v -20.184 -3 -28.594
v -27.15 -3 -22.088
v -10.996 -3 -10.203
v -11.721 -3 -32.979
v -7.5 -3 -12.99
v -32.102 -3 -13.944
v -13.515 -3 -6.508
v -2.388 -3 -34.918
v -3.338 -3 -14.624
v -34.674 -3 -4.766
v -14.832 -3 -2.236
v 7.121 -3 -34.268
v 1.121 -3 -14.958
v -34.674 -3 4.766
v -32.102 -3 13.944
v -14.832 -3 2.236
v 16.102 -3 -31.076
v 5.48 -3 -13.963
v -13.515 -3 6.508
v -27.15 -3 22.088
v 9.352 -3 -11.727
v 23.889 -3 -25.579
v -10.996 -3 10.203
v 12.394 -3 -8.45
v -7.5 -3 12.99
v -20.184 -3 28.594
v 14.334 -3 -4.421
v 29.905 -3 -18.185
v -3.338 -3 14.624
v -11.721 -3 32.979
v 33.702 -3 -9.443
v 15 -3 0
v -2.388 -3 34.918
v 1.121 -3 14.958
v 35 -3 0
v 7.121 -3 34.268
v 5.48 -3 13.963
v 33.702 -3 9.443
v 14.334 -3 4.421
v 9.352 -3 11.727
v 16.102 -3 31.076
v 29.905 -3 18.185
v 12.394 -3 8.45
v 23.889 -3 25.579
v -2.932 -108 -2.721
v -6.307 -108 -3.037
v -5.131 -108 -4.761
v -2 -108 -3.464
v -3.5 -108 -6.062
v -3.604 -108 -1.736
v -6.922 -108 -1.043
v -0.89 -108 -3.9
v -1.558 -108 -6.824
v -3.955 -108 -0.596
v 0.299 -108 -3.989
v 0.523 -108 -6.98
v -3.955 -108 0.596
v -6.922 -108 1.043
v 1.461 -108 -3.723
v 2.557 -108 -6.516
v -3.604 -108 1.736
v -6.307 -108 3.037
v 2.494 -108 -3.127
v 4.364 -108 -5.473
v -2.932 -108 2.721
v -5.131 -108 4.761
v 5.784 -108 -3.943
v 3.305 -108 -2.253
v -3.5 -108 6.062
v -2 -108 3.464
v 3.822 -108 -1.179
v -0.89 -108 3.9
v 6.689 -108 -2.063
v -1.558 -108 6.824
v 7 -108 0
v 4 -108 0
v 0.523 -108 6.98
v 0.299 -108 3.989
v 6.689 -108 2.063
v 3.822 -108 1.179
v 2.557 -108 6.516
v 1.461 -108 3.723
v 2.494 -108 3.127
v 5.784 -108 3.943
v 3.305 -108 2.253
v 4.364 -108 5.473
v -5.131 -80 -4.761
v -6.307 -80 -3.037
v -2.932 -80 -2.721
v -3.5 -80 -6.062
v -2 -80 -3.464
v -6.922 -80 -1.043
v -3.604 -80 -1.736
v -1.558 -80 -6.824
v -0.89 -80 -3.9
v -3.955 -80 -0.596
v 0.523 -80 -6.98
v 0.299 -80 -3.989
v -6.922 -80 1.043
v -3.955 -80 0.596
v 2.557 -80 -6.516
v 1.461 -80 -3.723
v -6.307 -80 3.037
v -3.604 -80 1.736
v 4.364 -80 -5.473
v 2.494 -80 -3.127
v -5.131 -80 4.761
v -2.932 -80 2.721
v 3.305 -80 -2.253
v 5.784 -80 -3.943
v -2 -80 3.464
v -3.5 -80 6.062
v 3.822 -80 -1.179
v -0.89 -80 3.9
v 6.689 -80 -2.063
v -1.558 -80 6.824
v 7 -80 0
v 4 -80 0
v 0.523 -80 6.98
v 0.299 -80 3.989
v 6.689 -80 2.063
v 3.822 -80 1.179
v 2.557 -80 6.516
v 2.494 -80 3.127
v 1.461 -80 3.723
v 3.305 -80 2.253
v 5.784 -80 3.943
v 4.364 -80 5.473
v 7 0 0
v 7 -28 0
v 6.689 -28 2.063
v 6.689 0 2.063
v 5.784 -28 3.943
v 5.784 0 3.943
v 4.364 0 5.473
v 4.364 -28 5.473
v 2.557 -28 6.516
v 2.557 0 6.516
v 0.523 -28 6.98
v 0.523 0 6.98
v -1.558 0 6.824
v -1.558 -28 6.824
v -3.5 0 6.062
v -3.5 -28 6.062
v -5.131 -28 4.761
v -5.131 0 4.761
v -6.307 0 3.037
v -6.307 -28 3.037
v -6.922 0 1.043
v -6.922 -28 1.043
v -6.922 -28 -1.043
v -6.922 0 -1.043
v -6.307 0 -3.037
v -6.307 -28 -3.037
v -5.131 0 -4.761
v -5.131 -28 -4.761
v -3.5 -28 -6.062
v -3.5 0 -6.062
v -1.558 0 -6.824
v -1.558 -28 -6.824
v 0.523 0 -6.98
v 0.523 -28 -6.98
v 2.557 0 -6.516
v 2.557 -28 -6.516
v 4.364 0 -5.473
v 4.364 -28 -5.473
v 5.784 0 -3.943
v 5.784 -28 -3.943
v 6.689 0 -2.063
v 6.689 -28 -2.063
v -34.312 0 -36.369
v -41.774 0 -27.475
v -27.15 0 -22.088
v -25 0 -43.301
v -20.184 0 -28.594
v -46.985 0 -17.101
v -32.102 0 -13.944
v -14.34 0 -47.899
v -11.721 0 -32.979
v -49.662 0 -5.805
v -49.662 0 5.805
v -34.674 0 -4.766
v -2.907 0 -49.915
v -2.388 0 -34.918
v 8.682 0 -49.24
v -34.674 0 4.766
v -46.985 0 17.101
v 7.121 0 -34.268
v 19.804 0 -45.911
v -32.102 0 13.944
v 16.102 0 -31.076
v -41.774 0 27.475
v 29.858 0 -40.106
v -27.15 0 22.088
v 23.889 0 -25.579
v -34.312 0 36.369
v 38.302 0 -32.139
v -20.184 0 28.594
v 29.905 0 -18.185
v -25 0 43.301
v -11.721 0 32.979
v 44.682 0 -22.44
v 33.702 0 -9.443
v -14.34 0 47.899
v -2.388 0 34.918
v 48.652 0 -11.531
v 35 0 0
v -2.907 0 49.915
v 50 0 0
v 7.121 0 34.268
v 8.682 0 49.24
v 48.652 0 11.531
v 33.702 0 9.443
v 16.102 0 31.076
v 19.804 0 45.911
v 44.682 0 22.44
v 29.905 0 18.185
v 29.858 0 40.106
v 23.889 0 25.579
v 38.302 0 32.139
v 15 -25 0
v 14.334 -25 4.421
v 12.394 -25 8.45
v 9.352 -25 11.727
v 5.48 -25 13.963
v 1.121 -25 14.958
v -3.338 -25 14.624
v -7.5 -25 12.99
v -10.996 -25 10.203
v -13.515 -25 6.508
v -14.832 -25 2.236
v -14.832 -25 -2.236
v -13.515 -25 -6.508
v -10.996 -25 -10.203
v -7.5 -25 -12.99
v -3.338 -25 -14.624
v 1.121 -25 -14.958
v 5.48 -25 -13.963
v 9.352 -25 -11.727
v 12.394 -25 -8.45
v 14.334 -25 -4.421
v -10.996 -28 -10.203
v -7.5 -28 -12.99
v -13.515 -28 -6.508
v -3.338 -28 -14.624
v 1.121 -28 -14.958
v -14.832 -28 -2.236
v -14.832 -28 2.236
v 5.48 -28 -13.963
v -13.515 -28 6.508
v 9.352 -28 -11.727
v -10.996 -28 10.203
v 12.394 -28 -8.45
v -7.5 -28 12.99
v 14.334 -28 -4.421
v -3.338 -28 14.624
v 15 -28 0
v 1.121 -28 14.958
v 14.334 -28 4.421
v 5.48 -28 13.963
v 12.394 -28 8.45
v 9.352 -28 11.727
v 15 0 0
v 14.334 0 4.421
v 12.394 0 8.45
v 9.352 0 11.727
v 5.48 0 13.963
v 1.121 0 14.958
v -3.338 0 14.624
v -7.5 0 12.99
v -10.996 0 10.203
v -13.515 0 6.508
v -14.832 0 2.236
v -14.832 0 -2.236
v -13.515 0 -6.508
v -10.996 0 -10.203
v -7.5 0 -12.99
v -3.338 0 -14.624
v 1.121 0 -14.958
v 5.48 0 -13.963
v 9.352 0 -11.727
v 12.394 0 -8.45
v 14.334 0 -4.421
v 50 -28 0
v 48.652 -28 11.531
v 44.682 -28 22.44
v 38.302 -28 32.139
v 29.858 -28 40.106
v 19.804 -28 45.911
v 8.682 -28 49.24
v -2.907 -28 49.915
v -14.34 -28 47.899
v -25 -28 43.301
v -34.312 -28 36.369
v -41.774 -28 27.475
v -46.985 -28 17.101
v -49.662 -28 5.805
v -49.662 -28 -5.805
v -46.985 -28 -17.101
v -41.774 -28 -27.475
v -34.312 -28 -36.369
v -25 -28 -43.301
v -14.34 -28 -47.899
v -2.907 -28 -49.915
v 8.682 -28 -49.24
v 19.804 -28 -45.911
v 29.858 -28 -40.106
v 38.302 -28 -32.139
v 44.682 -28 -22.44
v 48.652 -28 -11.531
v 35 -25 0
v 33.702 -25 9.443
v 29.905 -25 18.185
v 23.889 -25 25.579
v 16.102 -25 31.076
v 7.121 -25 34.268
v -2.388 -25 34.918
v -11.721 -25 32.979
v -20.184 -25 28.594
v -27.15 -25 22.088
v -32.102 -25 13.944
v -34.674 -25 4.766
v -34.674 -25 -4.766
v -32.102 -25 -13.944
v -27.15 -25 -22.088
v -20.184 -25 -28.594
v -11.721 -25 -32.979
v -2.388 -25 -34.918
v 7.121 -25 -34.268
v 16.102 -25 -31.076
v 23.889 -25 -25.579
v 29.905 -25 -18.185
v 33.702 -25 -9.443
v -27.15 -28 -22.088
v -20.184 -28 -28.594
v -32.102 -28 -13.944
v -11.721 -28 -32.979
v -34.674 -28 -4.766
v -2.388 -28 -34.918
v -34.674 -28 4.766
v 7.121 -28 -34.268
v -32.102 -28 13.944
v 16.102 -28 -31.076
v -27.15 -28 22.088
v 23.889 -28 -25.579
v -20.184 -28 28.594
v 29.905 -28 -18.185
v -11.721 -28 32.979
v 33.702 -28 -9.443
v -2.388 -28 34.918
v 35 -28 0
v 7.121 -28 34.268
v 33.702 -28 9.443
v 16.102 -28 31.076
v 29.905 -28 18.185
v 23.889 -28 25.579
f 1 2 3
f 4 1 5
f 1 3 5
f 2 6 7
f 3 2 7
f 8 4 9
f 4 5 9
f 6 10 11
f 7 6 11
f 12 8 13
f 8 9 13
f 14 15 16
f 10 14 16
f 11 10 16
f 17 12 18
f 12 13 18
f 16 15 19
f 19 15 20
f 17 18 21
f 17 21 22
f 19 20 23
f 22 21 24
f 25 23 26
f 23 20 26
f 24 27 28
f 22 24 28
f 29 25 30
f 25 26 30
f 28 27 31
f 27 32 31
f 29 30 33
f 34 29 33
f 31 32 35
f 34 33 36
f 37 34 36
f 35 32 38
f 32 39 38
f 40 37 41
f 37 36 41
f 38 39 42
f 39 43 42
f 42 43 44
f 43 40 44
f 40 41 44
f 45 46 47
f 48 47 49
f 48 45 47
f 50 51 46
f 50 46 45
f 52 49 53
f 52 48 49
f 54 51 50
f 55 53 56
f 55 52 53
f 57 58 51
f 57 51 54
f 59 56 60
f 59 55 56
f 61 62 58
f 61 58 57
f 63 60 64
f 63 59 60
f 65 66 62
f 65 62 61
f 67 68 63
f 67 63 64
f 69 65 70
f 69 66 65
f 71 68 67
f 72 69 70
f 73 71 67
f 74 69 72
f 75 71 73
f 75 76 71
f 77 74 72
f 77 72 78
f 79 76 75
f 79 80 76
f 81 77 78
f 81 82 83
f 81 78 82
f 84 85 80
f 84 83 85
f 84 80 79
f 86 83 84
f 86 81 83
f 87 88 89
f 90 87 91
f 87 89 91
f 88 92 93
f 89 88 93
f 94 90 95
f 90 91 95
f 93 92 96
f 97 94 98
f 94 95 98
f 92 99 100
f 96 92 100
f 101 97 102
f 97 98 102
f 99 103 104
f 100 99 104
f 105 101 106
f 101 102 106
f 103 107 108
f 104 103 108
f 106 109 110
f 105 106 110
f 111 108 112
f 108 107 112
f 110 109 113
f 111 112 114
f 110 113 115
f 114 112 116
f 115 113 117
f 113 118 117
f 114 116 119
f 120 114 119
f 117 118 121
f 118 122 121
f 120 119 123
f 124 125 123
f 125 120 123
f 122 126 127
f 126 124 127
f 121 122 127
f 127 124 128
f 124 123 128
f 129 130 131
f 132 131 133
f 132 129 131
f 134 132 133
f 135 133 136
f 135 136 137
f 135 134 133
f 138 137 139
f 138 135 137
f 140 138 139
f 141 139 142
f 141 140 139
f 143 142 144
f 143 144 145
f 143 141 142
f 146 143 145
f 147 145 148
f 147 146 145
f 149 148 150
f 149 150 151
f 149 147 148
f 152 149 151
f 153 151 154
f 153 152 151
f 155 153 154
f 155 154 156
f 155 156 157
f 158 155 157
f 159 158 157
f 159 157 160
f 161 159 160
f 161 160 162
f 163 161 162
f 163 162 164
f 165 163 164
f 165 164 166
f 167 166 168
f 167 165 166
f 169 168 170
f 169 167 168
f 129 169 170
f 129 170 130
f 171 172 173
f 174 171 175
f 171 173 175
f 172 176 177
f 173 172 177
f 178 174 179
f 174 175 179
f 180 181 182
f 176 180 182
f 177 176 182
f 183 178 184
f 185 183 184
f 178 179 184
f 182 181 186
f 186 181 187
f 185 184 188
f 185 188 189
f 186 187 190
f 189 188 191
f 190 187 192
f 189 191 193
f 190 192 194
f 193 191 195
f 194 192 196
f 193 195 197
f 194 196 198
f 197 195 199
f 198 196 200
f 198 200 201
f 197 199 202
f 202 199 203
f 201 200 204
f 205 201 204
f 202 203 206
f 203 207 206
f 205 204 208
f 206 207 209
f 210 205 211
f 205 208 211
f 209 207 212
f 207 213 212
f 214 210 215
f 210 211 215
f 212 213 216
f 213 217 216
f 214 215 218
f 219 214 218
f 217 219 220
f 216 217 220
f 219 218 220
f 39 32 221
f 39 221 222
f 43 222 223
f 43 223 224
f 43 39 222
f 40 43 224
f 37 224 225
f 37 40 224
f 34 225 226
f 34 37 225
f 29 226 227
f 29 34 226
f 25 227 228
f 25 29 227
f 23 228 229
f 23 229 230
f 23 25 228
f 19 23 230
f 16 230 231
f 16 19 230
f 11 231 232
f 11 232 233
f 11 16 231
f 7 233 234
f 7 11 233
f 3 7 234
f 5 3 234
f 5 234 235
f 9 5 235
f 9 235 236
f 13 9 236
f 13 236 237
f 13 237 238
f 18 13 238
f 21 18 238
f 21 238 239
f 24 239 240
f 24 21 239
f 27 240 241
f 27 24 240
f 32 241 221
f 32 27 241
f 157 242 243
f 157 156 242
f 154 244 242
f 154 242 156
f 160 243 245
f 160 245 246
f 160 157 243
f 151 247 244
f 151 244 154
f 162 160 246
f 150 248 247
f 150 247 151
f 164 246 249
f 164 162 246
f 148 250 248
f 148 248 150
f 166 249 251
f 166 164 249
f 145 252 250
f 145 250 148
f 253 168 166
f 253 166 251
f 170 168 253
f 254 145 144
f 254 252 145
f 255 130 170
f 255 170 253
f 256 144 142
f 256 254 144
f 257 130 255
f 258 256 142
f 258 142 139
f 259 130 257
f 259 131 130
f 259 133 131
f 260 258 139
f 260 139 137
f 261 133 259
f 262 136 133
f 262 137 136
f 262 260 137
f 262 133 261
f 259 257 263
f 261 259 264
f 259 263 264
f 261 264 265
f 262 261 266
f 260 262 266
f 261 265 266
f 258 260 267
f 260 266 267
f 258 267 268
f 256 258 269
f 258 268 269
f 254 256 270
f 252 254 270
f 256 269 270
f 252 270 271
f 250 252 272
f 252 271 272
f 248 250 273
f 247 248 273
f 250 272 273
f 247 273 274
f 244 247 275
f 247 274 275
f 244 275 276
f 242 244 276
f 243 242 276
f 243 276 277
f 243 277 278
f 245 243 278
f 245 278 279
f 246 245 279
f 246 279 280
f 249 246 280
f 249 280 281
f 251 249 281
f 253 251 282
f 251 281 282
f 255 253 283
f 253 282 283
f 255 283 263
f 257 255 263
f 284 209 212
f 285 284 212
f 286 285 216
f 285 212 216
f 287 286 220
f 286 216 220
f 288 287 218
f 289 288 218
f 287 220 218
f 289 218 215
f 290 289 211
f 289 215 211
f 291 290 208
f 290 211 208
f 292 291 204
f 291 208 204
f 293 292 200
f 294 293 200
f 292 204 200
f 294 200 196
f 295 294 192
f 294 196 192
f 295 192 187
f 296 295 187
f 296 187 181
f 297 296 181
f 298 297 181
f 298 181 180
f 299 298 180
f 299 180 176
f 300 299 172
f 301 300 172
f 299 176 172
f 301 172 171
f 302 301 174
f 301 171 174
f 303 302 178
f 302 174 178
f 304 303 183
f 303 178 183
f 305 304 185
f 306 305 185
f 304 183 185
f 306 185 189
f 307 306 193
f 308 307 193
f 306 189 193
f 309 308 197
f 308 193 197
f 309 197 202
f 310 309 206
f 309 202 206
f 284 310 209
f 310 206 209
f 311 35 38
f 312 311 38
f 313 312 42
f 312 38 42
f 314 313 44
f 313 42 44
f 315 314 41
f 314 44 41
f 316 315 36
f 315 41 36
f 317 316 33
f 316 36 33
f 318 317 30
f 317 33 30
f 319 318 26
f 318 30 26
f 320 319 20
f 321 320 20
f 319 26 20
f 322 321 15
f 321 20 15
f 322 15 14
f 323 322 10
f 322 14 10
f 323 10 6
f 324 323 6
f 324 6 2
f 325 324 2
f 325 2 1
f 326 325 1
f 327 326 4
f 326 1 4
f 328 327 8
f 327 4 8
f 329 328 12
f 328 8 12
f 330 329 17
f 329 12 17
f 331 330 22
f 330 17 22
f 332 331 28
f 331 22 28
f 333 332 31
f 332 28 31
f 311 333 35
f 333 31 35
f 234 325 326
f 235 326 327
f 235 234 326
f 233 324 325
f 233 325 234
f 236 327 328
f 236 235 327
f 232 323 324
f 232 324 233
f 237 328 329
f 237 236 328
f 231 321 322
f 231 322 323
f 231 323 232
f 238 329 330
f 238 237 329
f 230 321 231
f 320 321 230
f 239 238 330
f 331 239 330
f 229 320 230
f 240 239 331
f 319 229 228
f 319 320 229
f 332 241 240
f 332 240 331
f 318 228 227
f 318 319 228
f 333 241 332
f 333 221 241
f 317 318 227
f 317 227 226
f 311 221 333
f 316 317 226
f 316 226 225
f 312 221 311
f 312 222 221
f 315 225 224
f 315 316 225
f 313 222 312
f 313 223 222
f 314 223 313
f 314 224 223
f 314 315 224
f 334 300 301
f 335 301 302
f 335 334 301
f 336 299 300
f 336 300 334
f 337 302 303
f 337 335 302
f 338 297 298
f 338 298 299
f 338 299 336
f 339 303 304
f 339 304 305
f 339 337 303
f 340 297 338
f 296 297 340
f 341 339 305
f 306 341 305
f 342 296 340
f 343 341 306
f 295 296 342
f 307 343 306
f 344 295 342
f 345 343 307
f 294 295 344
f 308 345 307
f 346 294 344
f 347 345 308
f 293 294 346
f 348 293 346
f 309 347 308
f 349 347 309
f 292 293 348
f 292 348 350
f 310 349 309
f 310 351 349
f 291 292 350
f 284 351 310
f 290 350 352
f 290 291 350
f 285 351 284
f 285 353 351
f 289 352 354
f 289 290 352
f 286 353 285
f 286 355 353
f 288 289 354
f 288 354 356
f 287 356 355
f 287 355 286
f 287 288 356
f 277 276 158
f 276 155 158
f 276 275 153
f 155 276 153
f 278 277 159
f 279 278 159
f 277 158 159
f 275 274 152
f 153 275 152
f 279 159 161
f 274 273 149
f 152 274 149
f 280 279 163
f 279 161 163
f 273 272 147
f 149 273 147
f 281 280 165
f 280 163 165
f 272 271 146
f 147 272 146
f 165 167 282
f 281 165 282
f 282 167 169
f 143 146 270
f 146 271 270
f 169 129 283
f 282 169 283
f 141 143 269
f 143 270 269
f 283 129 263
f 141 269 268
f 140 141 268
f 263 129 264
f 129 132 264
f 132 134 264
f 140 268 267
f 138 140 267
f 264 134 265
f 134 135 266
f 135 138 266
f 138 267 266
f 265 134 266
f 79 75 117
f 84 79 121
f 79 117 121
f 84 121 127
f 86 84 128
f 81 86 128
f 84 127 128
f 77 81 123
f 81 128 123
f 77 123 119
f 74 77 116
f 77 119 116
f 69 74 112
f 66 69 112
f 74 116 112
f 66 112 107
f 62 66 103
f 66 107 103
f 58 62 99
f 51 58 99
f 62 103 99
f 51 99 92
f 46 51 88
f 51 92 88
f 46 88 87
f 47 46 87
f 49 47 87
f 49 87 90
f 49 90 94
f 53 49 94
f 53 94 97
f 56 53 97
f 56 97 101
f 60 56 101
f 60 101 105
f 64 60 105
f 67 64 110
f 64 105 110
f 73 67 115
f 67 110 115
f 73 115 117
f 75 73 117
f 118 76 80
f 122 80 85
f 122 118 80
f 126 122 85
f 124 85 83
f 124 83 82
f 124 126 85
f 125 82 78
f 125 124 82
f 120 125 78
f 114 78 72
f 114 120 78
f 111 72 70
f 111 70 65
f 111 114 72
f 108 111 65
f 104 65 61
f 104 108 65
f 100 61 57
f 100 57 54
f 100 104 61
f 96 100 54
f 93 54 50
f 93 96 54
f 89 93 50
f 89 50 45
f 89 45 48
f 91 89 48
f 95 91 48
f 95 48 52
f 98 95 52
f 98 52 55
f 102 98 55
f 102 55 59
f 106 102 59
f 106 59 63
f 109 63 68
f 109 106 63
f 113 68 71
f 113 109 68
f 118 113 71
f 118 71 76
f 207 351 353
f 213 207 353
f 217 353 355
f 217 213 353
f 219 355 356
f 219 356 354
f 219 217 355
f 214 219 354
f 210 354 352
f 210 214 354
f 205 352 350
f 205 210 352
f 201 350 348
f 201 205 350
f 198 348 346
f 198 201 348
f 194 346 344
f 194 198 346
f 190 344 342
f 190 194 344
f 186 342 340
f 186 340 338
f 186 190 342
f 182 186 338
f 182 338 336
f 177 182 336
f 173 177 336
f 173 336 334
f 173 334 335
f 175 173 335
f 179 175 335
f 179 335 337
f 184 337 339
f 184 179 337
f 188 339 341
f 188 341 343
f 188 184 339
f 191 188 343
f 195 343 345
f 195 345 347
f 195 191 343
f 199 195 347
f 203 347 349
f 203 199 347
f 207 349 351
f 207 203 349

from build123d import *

# Parameters (mm, degrees)
F0_R      = 15
F0_R_2    = 7
F1_DEPTH  = 28
F2_R      = 50
F2_R_2    = 35
F3_DEPTH  = 28
F6_R      = 35
F6_R_2    = 15
F7_DEPTH  = 22
F9_R      = 7
F9_R_2    = 4
F10_DEPTH = 28


with BuildPart() as f1:
    # F0 (on Front) → F1 (new body)
    with BuildSketch(Plane.XZ):
        Circle(F0_R)
        Circle(F0_R_2, mode=Mode.SUBTRACT)
    extrude(amount=F1_DEPTH)


with BuildPart() as f3:
    # F2 (on Front) → F3 (new body)
    with BuildSketch(Plane.XZ):
        Circle(F2_R)
        Circle(F2_R_2, mode=Mode.SUBTRACT)
    extrude(amount=F3_DEPTH)


with BuildPart() as f7:
    # F6 (on offset) → F7 (new body)
    with BuildSketch(Plane.XZ.offset(3)):
        Circle(F6_R)
        Circle(F6_R_2, mode=Mode.SUBTRACT)
    extrude(amount=F7_DEPTH)


with BuildPart() as f10:
    # F9 (on offset) → F10 (new body)
    with BuildSketch(Plane.XZ.offset(80)):
        Circle(F9_R)
        Circle(F9_R_2, mode=Mode.SUBTRACT)
    extrude(amount=F10_DEPTH)


solid = Compound([f1.part, f3.part, f7.part, f10.part])
